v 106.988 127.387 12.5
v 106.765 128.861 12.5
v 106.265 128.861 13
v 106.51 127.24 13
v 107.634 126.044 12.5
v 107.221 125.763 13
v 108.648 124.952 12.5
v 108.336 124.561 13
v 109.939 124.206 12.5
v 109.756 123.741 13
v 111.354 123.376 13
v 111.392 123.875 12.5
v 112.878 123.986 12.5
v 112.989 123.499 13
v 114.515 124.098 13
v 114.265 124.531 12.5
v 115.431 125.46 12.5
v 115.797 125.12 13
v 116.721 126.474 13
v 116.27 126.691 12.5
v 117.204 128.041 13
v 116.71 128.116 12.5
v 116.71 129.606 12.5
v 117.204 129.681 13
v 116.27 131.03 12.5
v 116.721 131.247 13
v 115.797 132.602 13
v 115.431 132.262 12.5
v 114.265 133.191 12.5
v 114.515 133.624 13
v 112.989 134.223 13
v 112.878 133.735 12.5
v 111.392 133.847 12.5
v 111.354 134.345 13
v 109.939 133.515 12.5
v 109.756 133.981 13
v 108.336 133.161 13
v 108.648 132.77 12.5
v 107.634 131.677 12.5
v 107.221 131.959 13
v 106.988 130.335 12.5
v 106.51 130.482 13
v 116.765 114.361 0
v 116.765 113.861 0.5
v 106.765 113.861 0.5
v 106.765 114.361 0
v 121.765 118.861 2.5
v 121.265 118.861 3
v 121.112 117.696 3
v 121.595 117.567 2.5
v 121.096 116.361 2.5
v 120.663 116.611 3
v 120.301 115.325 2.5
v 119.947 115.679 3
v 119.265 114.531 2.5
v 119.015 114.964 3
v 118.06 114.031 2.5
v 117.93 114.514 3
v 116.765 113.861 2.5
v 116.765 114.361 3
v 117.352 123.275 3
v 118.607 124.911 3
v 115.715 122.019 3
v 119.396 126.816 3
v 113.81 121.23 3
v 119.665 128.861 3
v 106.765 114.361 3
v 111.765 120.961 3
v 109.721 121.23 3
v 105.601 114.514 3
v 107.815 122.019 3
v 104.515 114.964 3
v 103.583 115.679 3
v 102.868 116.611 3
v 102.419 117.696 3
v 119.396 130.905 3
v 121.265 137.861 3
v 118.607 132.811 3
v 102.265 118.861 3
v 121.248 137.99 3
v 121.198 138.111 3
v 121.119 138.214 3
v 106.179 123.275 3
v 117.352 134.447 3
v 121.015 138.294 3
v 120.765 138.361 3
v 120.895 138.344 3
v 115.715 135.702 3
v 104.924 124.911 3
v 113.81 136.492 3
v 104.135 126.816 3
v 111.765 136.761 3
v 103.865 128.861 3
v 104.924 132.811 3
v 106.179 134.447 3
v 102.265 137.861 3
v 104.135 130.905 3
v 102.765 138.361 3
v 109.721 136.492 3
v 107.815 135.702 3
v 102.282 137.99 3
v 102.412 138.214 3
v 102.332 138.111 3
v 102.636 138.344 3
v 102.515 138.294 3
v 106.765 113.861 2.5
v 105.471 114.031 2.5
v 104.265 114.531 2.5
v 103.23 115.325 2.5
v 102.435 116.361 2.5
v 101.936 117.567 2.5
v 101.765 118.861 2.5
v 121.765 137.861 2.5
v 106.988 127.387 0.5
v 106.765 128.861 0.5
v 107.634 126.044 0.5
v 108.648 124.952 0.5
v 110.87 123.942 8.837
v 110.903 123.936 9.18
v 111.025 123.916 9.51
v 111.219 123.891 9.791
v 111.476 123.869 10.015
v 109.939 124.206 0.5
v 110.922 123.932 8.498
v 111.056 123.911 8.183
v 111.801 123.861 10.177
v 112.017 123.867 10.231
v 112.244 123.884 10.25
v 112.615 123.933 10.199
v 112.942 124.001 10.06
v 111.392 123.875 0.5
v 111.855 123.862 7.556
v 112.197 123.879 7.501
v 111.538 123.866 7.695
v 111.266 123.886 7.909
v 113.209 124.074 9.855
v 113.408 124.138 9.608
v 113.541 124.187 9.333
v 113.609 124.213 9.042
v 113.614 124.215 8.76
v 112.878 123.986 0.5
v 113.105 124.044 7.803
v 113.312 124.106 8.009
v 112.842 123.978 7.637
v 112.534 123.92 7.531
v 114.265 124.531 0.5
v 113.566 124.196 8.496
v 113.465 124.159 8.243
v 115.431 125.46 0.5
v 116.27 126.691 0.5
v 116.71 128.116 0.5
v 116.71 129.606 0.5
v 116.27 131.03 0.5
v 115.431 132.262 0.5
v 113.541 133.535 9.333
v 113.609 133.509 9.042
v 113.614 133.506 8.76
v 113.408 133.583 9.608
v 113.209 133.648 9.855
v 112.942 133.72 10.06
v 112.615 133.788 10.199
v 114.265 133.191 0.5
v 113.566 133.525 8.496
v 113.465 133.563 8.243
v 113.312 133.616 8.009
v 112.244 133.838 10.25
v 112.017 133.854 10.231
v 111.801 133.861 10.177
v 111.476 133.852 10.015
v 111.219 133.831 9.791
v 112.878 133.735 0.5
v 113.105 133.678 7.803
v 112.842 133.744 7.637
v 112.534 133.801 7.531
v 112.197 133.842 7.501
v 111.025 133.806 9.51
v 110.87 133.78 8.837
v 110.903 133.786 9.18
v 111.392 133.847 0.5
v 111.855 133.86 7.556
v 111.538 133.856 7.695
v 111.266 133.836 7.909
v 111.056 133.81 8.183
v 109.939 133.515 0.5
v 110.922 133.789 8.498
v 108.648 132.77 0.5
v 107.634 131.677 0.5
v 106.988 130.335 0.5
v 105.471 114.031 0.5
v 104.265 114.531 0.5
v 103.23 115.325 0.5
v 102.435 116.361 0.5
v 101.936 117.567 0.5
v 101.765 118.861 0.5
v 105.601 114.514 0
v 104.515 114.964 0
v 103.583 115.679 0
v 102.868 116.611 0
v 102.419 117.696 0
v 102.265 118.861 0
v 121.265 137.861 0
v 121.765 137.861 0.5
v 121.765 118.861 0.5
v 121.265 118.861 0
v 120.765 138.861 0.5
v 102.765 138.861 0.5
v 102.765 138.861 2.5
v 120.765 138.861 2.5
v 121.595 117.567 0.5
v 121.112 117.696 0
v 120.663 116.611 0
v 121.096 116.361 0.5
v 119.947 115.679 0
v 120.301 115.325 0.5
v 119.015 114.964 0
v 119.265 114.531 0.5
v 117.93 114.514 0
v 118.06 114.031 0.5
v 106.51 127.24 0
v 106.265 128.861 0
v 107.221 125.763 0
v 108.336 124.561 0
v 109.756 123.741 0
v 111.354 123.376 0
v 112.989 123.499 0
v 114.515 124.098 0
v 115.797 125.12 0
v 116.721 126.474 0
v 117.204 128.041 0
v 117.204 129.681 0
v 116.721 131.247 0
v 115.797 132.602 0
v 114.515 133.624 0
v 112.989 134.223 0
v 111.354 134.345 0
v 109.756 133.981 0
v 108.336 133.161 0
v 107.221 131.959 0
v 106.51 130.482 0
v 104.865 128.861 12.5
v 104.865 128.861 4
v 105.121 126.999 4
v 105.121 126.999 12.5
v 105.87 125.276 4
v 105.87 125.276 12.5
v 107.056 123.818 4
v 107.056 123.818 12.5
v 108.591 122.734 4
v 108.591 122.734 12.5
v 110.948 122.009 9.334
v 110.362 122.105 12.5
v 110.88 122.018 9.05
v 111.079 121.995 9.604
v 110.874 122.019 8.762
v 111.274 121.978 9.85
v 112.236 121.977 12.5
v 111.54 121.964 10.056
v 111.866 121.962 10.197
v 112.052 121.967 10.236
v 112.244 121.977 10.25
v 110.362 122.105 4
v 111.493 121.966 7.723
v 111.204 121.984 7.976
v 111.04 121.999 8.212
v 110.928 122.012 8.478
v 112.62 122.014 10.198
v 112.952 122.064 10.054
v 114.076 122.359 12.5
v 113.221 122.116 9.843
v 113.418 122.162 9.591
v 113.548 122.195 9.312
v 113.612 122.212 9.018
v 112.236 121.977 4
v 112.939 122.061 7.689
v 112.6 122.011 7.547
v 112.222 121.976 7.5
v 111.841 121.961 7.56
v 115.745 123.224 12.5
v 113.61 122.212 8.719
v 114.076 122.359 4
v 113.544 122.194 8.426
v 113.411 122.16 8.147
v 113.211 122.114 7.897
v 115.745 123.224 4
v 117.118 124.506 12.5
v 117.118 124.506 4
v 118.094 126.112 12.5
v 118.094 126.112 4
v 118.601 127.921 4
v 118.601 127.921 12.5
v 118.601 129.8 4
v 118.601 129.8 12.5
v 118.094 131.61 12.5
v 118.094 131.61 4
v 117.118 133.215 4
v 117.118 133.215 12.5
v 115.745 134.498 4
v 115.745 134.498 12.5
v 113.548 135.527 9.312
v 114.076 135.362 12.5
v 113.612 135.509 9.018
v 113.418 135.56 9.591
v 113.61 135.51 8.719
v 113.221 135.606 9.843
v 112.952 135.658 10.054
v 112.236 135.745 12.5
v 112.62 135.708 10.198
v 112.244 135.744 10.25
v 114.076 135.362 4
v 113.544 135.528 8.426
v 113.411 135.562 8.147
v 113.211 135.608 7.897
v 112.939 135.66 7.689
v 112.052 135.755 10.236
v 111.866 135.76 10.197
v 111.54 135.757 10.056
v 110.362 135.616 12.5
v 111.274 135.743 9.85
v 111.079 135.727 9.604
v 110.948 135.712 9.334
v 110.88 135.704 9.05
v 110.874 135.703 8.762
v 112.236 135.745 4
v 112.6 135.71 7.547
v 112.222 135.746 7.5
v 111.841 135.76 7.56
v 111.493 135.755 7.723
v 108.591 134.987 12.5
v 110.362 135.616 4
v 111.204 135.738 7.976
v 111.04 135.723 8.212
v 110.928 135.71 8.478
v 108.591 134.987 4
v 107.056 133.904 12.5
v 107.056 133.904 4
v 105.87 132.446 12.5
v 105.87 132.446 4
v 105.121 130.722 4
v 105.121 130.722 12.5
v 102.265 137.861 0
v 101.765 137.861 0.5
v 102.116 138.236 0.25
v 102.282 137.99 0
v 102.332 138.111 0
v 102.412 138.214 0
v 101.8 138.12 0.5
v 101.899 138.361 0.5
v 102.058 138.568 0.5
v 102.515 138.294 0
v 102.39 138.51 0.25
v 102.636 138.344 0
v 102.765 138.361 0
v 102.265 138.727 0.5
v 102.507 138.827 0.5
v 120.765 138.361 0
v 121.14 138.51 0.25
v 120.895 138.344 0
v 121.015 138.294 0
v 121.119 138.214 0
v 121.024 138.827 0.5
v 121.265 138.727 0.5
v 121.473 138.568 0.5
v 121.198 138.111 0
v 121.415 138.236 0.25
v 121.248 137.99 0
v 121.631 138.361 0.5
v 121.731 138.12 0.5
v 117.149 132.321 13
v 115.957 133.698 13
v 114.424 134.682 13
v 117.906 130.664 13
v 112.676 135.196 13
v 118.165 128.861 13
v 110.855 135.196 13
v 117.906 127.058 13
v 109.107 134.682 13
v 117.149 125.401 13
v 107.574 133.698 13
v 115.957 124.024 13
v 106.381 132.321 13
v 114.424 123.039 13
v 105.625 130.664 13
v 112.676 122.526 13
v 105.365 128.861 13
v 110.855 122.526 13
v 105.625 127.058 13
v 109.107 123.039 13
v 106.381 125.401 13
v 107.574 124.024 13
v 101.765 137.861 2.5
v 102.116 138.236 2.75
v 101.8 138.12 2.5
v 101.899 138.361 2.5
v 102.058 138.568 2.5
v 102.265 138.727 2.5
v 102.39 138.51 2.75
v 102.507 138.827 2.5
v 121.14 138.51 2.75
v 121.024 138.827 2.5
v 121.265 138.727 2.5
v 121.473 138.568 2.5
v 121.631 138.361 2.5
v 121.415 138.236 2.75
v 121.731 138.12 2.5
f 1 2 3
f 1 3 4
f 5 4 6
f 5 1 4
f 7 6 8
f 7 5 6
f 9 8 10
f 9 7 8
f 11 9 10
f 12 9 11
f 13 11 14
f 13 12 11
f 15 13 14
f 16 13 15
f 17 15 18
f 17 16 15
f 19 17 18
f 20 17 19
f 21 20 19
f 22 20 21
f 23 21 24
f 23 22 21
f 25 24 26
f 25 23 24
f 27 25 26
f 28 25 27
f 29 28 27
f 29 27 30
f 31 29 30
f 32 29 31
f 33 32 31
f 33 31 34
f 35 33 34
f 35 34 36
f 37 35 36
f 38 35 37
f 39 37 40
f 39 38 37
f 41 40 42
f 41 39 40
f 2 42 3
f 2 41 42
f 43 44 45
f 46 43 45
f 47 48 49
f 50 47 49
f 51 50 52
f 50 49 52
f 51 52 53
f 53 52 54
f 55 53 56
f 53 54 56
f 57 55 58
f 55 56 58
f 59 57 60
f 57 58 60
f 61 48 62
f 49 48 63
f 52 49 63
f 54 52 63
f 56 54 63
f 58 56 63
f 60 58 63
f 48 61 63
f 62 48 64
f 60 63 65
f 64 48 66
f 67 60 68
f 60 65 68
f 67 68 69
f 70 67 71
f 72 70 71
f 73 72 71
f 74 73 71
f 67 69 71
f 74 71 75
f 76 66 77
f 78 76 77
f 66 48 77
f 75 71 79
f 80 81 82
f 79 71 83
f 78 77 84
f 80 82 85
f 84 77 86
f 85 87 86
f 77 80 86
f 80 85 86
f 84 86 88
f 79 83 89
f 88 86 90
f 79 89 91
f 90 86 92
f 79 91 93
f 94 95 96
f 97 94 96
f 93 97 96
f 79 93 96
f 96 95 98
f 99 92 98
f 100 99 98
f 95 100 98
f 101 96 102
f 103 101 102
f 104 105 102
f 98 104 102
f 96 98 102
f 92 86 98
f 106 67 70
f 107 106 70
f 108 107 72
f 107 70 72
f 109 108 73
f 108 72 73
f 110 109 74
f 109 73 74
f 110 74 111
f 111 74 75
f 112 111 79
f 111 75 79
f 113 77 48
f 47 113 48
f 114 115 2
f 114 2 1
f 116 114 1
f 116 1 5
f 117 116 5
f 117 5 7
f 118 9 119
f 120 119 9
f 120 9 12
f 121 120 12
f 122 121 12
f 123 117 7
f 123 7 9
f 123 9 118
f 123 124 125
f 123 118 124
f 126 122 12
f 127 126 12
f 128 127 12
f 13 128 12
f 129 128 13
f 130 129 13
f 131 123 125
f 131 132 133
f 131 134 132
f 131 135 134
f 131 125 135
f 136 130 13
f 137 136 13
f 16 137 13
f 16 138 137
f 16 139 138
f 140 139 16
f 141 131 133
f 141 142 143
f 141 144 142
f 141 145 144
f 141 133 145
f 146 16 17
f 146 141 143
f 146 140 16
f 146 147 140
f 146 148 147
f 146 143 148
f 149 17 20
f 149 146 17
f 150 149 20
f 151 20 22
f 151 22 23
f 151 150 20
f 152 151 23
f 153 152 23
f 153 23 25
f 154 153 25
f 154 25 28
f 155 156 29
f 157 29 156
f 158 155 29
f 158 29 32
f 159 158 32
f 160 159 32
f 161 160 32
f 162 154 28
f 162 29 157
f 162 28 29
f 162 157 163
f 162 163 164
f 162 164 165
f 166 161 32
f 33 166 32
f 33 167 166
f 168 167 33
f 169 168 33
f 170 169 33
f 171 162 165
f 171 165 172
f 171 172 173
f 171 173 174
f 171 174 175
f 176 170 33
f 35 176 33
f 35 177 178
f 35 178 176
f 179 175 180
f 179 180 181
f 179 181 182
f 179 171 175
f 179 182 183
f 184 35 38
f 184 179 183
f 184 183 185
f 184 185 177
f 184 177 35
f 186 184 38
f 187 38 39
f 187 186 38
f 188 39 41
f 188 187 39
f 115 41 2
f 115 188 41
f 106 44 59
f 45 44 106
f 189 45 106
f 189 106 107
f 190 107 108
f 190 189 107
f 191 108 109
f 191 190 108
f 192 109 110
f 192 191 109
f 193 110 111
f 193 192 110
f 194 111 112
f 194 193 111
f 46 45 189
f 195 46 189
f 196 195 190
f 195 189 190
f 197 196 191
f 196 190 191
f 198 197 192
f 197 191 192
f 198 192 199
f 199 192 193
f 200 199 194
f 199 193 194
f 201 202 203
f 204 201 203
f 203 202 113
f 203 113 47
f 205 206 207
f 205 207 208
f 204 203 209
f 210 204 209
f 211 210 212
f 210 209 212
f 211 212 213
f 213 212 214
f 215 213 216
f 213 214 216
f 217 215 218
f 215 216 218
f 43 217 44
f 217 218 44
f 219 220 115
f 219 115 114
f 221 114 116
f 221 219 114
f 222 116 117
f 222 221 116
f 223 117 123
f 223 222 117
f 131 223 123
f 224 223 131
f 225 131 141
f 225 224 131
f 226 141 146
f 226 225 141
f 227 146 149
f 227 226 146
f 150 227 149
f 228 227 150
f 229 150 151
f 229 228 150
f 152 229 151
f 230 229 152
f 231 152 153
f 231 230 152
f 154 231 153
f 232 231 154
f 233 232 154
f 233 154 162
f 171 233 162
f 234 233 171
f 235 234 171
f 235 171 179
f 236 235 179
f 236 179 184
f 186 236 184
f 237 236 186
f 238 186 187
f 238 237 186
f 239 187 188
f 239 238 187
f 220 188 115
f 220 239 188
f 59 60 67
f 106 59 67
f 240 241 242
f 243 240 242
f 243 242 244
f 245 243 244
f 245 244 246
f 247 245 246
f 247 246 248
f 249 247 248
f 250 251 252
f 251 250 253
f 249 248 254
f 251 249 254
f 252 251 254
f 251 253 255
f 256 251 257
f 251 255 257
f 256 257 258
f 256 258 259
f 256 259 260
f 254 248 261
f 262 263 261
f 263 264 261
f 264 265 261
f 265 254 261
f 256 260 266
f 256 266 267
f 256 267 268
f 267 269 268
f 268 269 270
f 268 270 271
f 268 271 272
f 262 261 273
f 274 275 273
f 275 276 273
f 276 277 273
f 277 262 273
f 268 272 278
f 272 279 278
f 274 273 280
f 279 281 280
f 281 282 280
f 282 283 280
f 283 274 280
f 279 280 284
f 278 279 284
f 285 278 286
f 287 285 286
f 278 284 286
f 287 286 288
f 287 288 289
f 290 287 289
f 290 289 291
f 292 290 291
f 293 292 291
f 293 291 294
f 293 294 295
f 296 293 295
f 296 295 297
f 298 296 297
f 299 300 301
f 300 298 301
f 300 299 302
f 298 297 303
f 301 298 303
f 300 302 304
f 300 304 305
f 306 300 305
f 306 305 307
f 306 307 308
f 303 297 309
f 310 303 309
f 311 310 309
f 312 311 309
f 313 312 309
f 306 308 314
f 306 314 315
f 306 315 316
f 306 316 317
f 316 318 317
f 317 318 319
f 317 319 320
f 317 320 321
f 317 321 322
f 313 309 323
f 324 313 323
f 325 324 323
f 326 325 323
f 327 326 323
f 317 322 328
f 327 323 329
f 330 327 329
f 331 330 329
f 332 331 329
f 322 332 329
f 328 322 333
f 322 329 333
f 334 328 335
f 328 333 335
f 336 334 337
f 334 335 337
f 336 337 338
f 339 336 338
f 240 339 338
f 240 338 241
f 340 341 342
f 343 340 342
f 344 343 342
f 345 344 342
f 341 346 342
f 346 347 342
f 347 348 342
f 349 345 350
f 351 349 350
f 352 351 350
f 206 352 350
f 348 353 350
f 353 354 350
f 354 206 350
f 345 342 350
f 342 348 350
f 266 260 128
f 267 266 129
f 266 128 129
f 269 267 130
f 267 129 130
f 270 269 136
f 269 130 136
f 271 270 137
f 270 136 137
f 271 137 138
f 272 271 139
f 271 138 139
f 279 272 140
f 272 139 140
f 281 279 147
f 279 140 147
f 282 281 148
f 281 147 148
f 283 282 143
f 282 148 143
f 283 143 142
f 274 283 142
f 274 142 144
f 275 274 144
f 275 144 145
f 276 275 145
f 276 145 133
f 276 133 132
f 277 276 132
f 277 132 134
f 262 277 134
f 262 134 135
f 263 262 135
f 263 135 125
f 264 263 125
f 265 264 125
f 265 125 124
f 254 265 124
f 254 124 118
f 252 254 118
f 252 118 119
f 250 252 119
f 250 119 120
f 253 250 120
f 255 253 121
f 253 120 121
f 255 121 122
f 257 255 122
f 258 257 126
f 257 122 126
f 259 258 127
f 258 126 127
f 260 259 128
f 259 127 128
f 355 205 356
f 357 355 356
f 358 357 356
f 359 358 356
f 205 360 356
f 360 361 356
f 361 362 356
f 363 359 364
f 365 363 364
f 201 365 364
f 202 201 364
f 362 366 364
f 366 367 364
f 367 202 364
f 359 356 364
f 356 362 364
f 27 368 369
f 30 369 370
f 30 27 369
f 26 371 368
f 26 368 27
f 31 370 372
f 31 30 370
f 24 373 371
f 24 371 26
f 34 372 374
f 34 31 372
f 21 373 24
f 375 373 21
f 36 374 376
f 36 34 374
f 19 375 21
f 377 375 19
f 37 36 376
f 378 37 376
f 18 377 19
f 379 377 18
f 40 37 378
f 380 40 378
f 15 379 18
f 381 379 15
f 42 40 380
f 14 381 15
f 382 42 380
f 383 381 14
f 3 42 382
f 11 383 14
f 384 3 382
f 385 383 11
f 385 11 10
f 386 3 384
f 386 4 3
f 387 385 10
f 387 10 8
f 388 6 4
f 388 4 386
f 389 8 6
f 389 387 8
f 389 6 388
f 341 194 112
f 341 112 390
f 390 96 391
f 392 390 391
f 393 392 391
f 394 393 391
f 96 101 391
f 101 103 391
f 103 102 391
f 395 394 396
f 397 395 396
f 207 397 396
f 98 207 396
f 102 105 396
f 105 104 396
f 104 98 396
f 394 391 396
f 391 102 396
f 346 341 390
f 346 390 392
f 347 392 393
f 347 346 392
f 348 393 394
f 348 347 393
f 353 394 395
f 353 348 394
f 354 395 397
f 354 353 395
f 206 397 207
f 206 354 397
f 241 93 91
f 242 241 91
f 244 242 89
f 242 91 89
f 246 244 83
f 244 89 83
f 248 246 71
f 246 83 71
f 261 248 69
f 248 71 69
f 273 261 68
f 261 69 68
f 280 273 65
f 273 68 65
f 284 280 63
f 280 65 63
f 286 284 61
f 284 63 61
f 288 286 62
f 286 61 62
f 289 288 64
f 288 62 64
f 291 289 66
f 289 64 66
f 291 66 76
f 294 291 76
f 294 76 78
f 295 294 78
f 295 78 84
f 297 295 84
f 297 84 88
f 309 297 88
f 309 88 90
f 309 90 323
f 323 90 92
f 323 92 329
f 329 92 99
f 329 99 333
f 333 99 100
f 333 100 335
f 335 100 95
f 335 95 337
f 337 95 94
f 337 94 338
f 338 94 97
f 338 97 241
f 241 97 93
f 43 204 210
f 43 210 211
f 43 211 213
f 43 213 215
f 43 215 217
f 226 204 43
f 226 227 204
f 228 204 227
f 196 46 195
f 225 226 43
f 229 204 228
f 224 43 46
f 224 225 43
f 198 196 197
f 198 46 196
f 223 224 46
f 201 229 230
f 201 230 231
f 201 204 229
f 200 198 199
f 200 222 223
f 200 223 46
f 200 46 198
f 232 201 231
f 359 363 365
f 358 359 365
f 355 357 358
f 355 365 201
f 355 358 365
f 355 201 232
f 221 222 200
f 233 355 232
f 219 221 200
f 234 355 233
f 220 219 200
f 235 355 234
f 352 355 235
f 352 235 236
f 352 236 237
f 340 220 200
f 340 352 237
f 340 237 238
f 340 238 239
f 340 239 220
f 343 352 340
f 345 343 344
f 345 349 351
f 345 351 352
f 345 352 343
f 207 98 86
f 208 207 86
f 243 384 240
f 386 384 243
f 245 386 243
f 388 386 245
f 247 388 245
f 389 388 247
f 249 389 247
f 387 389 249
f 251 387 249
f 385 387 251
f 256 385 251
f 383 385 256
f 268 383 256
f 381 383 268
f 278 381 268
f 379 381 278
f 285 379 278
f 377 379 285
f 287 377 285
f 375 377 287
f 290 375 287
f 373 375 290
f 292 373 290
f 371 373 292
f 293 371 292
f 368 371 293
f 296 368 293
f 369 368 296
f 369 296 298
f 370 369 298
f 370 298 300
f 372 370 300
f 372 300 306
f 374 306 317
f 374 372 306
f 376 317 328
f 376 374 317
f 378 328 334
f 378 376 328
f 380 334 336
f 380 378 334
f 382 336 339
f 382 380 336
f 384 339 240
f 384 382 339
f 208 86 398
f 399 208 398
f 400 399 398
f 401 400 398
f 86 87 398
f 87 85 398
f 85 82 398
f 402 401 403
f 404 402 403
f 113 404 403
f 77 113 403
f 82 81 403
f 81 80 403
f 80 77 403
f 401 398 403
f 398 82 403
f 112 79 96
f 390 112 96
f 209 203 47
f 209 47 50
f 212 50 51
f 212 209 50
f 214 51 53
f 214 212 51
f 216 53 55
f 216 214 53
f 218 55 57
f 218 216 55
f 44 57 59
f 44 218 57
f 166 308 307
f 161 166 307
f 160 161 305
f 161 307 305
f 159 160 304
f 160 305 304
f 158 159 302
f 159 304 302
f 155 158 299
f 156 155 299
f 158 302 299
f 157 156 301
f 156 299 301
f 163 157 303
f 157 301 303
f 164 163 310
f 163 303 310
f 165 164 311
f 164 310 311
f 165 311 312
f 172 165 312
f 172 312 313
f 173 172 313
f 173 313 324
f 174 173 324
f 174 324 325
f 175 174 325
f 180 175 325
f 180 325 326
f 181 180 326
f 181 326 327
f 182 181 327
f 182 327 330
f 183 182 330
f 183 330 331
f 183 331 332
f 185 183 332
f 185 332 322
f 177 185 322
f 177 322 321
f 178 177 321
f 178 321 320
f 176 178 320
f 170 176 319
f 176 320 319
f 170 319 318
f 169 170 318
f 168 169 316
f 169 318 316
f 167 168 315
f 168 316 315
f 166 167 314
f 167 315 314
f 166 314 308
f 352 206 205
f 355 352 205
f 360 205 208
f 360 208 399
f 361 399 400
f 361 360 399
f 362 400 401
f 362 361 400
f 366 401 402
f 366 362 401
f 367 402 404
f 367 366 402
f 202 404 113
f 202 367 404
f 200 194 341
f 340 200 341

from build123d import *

# Parameters (mm, degrees)
SKETCH2_R           = 6.9
BOSS_EXTRUDE1_DEPTH = 3
SKETCH3_R           = 6.9
SKETCH3_R_2         = 5
BOSS_EXTRUDE2_DEPTH = 13
CHAMFER1_SIZE       = 0.5
CHAMFER2_SIZE       = 1
SKETCH4_R           = 1.375
CUT_EXTRUDE1_DEPTH  = 20


with BuildPart() as part:
    # Sketch2 → Boss-Extrude1 (new body)
    with BuildSketch(Plane.XY):
        with BuildLine():
            Line((102.765440341, 138.860814374), (120.765440341, 138.860814374))
            ThreePointArc((120.765440341, 138.860814374), (121.472547122, 138.567921155), (121.765440341, 137.860814374))
            Line((121.765440341, 137.860814374), (121.765440341, 118.860814374))
            ThreePointArc((121.765440341, 118.860814374), (120.300974247, 115.325280468), (116.765440341, 113.860814374))
            Line((116.765440341, 113.860814374), (106.765440341, 113.860814374))
            ThreePointArc((106.765440341, 113.860814374), (103.229906435, 115.325280468), (101.765440341, 118.860814374))
            Line((101.765440341, 118.860814374), (101.765440341, 137.860814374))
            ThreePointArc((101.765440341, 137.860814374), (102.058333559, 138.567921155), (102.765440341, 138.860814374))
        make_face()
        with Locations((111.765440341, 128.860814374)):
            Circle(SKETCH2_R, mode=Mode.SUBTRACT)
    extrude(amount=BOSS_EXTRUDE1_DEPTH)

    # Sketch3 → Boss-Extrude2 (add)
    with BuildSketch(Plane.XY):
        with Locations(Location((111.765440341, 128.860814374, 0), (0, 0, 180))):
            Circle(SKETCH3_R)
        with Locations(Location((111.765440341, 128.860814374, 0), (0, 0, 180))):
            Circle(SKETCH3_R_2, mode=Mode.SUBTRACT)
    extrude(amount=BOSS_EXTRUDE2_DEPTH)

    # Chamfer1
    chamfer1_edges = [part.edges().sort_by_distance(p)[0] for p in [
        (121.472547122, 138.567921155, 0),
        (121.765440341, 128.360814374, 0),
        (111.765440341, 138.860814374, 3),
        (120.300974247, 115.325280468, 0),
        (111.765440341, 113.860814374, 0),
        (103.229906435, 115.325280468, 0),
        (101.765440341, 128.360814374, 0),
        (102.058333559, 138.567921155, 0),
        (111.765440341, 138.860814374, 0),
        (102.058333559, 138.567921155, 3),
        (101.765440341, 128.360814374, 3),
        (103.229906435, 115.325280468, 3),
        (118.665440341, 128.860814374, 13),
        (116.765440341, 128.860814374, 0),
        (116.765440341, 128.860814374, 13),
        (111.765440341, 113.860814374, 3),
        (120.300974247, 115.325280468, 3),
        (121.765440341, 128.360814374, 3),
        (121.472547122, 138.567921155, 3),
    ]]
    chamfer(chamfer1_edges, length=CHAMFER1_SIZE)

    # Chamfer2
    chamfer2_edges = [part.edges().sort_by_distance(p)[0] for p in [
        (118.665440341, 128.860814374, 3),
    ]]
    chamfer(chamfer2_edges, length=CHAMFER2_SIZE)

    # Sketch4 → Cut-Extrude1 (cut)
    with BuildSketch(Plane(origin=(0, 138.860814374, 0), x_dir=(1, 0, 0), z_dir=(0, 1, 0))):
        with Locations(Location((112.244247242, -8.875, 0), (0, 0, 270))):
            Circle(SKETCH4_R)
    extrude(amount=-CUT_EXTRUDE1_DEPTH, mode=Mode.SUBTRACT)


solid = part.part
